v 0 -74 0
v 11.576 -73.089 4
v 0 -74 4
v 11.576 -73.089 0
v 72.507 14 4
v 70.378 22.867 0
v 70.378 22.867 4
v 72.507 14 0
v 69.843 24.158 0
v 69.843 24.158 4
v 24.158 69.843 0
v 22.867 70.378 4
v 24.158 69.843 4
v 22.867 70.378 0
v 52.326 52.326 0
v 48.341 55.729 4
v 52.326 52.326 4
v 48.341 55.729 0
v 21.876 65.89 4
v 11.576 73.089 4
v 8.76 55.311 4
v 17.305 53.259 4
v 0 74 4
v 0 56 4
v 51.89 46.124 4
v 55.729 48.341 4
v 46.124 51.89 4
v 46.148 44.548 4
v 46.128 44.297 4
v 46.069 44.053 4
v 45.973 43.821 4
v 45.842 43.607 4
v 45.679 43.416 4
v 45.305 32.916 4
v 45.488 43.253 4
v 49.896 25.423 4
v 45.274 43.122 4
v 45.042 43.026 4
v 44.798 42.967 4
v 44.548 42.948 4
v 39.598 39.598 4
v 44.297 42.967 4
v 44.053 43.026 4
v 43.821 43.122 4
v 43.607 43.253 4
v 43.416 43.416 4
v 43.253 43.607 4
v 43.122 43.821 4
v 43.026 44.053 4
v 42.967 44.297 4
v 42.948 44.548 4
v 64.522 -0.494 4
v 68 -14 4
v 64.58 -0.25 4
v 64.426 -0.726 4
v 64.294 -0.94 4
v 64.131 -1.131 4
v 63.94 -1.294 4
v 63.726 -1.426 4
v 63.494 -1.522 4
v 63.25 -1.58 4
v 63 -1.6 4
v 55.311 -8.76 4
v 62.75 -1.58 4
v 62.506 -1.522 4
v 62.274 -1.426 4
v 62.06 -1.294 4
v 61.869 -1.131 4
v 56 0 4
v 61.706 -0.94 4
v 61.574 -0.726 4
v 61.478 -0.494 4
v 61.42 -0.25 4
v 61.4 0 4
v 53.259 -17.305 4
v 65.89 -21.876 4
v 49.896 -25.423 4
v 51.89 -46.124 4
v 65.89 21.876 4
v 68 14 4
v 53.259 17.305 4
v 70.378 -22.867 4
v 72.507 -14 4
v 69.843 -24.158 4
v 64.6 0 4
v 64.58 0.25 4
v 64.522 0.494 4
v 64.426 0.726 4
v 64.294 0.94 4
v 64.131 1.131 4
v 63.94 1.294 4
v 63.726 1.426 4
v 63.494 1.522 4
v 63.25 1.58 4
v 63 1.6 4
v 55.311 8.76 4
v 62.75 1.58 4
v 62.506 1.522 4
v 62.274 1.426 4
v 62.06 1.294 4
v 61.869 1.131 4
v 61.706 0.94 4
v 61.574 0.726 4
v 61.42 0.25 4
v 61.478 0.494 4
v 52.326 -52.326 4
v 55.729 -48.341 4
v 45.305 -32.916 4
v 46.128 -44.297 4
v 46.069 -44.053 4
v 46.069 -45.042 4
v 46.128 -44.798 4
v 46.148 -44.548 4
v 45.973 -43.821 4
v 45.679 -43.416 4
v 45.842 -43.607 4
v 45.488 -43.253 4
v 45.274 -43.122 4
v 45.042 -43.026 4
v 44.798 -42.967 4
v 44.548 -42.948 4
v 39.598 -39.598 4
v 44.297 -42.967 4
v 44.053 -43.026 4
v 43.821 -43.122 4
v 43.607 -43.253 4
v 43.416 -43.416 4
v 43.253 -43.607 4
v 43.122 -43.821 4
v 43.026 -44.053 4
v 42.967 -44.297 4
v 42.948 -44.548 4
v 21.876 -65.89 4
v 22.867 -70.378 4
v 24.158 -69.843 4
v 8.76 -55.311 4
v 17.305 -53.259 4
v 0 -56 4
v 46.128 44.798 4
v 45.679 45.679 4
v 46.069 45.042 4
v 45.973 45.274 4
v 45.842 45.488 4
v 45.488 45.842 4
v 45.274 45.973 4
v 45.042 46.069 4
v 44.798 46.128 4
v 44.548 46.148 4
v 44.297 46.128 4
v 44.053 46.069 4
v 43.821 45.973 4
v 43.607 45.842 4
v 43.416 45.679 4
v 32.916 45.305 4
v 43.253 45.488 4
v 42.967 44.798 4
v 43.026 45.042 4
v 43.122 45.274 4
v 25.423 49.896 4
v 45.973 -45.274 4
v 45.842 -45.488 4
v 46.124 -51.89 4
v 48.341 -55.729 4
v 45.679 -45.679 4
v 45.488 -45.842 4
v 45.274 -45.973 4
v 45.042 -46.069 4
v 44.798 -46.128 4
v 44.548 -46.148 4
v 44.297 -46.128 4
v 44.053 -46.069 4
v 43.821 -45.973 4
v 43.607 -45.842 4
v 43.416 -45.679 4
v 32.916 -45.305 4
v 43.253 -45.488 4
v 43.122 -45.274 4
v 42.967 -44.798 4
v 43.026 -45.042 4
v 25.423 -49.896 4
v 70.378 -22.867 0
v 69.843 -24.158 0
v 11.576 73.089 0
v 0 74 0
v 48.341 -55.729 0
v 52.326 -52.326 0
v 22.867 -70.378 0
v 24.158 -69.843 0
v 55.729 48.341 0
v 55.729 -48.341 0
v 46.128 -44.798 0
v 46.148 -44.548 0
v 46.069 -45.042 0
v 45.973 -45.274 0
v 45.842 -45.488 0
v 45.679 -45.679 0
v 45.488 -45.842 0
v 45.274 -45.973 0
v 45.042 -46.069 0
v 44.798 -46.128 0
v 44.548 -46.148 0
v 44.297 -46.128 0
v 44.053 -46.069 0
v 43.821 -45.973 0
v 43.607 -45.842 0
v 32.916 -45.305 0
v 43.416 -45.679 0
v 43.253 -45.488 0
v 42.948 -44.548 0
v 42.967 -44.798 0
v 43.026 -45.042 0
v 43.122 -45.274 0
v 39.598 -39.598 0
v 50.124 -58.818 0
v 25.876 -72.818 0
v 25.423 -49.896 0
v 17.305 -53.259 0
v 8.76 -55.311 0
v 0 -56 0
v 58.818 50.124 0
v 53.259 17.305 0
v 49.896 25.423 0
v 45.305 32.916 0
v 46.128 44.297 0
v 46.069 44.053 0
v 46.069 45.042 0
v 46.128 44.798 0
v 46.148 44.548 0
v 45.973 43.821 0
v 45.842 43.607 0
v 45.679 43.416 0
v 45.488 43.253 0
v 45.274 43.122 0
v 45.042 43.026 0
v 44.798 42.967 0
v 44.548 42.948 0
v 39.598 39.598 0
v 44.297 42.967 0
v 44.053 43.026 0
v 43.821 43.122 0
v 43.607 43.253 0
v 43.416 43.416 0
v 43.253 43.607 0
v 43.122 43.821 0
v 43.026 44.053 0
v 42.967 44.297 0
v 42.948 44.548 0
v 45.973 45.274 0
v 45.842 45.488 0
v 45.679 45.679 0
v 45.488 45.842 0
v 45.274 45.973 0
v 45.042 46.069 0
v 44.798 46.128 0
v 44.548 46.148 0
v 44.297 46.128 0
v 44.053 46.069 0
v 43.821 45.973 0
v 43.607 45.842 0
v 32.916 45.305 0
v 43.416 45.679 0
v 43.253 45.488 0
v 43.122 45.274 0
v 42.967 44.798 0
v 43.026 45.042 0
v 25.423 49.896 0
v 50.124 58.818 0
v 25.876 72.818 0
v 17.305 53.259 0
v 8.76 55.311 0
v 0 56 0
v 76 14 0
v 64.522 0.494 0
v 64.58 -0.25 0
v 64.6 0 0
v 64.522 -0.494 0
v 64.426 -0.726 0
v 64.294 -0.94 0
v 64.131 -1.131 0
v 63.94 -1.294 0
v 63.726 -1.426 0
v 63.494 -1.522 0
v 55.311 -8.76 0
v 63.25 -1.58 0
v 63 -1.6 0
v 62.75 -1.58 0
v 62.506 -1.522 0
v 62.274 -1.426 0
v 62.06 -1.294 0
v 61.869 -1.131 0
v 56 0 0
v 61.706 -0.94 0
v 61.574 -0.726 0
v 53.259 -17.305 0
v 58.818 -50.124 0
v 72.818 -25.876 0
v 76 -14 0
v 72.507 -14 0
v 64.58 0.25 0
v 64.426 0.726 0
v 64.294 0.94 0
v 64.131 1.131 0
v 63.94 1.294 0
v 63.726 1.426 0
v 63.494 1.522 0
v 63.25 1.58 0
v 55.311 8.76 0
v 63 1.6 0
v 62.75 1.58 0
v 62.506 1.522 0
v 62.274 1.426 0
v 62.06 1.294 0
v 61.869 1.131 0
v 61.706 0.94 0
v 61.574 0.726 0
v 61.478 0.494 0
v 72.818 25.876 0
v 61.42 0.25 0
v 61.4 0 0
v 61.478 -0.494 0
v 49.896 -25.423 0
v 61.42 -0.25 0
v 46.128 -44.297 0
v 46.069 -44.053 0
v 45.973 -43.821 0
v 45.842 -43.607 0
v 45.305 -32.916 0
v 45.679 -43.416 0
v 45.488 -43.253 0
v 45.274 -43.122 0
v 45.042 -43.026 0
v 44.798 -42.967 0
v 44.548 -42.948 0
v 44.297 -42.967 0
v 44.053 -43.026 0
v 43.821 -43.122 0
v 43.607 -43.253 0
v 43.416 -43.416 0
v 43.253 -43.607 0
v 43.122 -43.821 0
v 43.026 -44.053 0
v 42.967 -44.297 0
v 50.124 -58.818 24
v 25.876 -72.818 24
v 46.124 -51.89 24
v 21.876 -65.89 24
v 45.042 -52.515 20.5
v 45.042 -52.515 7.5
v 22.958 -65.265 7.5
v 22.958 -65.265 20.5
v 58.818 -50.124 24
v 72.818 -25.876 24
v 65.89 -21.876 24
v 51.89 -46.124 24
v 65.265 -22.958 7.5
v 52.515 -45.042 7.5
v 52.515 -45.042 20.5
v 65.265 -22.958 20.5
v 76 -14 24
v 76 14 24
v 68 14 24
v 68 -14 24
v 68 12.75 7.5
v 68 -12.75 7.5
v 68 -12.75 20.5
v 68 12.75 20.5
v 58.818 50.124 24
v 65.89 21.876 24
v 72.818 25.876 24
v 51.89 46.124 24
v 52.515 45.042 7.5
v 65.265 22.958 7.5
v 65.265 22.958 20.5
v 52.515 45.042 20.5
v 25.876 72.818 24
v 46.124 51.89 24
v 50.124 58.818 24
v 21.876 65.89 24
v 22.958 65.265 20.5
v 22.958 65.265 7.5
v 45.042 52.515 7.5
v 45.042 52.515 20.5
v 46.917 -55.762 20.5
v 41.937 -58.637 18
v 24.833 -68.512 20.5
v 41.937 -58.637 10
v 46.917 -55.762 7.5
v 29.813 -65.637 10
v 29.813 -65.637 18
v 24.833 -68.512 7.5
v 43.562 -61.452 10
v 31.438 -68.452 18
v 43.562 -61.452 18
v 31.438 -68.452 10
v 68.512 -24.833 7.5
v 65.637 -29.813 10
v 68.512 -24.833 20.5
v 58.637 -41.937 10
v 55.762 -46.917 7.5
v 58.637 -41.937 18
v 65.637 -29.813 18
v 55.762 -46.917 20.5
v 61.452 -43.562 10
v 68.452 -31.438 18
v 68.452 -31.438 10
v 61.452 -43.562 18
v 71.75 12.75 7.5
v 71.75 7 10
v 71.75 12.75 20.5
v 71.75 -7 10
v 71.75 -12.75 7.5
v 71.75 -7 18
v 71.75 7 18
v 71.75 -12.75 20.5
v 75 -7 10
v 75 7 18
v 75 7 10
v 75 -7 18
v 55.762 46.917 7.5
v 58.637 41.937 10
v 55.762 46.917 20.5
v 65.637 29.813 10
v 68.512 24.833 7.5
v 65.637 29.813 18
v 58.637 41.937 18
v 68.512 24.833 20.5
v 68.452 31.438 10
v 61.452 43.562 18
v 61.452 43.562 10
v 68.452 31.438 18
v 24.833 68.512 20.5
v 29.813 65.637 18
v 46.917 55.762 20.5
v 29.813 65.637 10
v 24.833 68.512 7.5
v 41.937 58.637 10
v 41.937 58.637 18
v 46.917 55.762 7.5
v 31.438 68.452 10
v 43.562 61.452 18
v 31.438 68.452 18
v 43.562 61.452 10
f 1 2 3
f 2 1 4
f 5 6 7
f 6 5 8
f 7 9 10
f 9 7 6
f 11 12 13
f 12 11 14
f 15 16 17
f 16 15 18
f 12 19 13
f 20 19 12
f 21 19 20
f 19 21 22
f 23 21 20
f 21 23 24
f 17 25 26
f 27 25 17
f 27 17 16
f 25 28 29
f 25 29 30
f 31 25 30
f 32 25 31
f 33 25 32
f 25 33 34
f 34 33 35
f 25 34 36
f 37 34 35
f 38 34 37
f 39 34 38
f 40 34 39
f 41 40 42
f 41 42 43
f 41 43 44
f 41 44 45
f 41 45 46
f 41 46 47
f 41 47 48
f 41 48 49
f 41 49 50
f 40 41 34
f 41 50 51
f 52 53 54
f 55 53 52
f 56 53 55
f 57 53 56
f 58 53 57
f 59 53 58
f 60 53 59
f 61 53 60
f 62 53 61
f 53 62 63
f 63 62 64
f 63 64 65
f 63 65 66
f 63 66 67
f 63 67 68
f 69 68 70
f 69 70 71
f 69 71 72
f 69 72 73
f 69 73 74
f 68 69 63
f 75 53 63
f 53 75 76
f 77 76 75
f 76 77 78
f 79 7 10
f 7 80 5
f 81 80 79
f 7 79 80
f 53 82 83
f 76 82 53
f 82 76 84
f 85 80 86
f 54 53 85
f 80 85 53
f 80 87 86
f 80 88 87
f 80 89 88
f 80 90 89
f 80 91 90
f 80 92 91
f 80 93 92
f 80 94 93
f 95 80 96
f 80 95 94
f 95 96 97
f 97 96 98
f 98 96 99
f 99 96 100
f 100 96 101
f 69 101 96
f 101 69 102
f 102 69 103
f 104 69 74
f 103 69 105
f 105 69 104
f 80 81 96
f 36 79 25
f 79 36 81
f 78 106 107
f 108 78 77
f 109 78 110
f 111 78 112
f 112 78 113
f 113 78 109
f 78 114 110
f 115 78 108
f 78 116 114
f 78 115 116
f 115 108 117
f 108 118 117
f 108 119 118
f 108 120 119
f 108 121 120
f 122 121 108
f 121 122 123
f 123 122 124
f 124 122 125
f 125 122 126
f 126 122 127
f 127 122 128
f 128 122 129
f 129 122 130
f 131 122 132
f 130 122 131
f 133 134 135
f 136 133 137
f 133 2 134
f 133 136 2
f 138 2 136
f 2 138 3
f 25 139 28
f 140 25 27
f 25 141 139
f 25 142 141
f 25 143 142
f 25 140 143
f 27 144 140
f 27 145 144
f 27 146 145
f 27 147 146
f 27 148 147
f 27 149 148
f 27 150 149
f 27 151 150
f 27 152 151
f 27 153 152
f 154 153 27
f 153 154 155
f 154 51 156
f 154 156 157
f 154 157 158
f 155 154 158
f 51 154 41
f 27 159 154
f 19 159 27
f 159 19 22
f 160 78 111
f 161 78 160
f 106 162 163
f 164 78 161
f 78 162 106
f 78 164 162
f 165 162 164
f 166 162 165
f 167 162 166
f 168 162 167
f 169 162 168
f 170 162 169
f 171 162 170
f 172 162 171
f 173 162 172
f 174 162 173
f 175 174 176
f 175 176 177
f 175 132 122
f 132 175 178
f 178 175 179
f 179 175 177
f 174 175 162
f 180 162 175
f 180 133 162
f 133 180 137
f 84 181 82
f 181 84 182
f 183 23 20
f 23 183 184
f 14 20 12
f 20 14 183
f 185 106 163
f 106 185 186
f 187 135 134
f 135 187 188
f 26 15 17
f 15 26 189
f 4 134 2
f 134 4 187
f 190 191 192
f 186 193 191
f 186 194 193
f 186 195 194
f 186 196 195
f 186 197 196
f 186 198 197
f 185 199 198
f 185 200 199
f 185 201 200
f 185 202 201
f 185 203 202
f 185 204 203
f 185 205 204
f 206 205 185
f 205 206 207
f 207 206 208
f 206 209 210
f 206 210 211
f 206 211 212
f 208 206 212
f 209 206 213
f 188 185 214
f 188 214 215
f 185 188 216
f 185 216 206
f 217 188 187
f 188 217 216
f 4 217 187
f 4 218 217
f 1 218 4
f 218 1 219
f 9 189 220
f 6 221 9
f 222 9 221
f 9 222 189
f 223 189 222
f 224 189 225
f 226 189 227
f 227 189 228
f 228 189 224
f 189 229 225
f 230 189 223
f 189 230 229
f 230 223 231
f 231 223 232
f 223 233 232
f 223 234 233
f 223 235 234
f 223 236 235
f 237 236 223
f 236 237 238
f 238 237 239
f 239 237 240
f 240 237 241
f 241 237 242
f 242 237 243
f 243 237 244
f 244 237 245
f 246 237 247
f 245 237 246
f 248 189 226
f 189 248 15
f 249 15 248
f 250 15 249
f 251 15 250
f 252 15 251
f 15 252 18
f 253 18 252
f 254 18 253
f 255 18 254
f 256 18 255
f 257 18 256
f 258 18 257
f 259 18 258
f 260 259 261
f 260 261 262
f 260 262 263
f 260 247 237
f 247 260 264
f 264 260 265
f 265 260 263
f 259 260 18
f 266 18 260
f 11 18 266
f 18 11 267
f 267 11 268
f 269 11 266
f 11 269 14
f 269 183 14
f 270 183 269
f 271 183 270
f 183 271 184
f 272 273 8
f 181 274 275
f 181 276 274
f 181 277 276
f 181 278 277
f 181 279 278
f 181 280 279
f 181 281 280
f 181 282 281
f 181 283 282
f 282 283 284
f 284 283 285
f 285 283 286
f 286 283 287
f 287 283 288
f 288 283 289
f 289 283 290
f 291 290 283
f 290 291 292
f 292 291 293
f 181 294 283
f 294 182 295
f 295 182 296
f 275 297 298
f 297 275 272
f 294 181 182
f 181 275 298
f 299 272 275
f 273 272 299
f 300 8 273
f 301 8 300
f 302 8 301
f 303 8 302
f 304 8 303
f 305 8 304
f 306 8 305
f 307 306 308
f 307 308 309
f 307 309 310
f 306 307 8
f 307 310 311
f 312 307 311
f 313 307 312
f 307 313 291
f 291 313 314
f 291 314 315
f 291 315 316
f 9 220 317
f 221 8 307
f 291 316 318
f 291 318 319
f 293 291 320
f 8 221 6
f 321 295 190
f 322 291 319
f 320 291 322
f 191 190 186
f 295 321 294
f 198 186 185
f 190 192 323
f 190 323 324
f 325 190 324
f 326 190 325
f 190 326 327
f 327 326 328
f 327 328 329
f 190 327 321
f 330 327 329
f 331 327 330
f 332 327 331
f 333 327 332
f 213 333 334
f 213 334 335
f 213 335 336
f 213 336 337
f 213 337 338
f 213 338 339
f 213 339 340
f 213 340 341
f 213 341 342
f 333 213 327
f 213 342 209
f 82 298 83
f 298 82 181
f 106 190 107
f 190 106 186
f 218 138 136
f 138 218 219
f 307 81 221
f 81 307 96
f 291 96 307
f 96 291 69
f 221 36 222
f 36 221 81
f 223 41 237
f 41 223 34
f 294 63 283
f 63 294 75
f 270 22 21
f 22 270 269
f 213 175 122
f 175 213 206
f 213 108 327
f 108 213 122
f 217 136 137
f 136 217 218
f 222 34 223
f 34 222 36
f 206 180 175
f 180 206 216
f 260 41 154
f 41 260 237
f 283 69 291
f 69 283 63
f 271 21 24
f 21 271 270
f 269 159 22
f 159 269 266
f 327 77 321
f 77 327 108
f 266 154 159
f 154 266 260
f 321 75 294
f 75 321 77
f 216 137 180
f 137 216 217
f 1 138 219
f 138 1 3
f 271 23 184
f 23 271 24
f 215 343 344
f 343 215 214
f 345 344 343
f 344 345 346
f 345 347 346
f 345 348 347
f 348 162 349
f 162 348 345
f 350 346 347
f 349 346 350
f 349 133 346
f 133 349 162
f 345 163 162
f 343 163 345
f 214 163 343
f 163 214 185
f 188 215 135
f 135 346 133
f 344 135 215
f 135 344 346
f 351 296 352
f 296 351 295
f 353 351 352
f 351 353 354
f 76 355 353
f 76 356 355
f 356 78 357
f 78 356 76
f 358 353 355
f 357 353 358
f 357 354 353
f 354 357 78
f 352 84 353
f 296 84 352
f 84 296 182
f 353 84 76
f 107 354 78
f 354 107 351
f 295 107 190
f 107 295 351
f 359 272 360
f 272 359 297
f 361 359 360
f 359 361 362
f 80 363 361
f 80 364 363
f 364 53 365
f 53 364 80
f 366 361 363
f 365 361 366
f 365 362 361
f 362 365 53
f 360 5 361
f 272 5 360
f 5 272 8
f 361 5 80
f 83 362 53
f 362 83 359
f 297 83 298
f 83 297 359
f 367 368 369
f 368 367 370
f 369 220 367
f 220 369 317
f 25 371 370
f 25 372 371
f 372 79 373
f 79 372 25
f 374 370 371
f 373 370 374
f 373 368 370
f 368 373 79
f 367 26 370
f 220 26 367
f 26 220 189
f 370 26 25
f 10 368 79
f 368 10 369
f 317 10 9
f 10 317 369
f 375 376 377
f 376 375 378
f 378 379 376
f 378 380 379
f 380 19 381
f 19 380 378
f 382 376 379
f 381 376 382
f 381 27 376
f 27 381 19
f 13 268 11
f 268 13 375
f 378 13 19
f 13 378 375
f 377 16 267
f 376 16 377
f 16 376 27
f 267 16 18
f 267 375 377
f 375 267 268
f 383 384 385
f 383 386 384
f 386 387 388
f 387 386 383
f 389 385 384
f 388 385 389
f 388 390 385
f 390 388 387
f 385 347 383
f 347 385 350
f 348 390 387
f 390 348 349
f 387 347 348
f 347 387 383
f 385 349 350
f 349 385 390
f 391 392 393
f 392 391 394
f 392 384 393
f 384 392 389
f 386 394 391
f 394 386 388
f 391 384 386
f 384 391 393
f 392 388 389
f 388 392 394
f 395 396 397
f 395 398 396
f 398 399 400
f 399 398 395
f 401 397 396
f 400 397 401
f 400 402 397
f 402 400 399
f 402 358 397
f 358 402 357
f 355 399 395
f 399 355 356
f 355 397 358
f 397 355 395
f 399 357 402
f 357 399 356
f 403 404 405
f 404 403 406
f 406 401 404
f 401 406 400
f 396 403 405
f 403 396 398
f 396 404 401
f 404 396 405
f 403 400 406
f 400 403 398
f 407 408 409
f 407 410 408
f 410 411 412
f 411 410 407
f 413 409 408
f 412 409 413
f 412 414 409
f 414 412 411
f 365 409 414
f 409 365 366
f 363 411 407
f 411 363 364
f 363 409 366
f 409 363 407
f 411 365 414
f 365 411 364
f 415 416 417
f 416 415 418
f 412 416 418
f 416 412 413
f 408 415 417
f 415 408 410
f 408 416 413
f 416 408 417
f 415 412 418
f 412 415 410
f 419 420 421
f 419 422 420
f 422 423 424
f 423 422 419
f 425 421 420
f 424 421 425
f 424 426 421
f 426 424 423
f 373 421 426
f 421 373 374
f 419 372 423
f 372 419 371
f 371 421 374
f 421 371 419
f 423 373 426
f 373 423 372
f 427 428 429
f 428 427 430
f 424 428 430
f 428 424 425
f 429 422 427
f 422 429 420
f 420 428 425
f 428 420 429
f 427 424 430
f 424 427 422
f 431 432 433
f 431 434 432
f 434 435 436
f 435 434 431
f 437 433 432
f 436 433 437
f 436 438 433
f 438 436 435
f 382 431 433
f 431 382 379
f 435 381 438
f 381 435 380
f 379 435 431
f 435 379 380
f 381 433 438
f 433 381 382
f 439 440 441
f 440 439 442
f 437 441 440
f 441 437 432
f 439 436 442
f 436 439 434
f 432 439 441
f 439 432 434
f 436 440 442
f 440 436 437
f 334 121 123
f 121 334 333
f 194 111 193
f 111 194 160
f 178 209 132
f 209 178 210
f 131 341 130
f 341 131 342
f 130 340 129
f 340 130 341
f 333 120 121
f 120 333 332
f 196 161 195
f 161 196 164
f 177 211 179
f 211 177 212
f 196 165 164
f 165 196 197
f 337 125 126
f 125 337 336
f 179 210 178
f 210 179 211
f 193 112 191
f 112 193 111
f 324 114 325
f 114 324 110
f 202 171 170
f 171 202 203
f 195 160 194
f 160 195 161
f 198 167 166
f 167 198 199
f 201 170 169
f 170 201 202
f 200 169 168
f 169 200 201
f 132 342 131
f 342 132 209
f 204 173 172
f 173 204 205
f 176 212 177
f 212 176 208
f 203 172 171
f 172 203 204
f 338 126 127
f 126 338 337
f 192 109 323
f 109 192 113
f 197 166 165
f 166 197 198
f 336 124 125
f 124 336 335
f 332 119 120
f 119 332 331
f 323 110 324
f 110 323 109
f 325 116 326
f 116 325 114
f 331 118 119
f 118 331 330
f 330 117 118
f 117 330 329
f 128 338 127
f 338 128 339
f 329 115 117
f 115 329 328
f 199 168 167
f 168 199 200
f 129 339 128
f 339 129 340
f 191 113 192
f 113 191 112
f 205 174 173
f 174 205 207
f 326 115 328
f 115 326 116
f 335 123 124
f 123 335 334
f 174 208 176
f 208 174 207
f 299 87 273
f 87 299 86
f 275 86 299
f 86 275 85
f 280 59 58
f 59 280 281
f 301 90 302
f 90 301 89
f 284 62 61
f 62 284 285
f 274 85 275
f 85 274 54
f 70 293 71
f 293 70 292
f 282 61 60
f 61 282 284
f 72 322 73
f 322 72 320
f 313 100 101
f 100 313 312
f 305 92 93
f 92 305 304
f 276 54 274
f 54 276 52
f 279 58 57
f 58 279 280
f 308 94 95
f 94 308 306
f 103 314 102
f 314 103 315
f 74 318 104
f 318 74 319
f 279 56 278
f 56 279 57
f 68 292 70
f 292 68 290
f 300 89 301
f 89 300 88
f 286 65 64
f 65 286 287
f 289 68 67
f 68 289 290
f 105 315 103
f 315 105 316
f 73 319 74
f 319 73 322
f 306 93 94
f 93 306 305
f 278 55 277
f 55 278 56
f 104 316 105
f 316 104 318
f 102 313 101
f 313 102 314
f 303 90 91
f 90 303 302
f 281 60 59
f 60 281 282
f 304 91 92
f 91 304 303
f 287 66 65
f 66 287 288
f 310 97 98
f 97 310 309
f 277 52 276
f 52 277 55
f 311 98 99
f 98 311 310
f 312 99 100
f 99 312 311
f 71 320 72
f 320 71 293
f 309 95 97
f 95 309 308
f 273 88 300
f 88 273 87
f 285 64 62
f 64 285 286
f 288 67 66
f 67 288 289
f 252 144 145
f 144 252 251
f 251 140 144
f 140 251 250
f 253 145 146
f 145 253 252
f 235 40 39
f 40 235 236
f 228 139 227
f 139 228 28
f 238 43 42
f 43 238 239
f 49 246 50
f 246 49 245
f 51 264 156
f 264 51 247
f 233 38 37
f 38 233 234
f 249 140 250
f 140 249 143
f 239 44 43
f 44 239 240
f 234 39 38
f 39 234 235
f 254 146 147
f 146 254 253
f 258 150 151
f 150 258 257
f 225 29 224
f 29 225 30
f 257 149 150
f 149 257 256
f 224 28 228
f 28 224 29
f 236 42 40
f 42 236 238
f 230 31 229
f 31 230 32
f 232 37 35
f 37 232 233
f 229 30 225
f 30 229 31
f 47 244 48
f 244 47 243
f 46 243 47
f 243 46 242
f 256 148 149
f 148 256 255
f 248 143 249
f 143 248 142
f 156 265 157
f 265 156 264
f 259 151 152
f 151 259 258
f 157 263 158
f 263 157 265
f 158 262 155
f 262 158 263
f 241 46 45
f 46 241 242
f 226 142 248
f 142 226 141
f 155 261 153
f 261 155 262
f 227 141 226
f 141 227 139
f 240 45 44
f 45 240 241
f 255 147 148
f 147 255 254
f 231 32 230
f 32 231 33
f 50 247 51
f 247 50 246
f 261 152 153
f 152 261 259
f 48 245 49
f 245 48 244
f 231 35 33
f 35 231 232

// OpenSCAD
// RoverSAR 5-Channel VL53L0X Time-of-Flight Sensor Arc Mount
// Angles: -60 deg, -30 deg, 0 deg, +30 deg, +60 deg | Mounting: M3 base bolts + M2.5 PCB screws

$fn = 40;

arc_radius = 68.0;
mount_height = 24.0;
wall_thick = 4.0;
angles = [-60, -30, 0, 30, 60];

module sensor_pocket() {
    // Breakout board cavity (25mm W x 12mm H) + optical emitter/SPAD window
    translate([0, 0, mount_height / 2 + 2.0]) {
        cube([4.5, 25.5, 13.0], center = true);
        translate([2.5, 0, 0])
            cube([6.0, 14.0, 8.0], center = true);
    }
}

difference() {
    union() {
        // Curved mounting flange base
        difference() {
            cylinder(h = 4.0, r = arc_radius + 6.0);
            translate([0, 0, -0.5]) cylinder(h = 5.0, r = arc_radius - 12.0);
            translate([-80, -80, -0.5]) cube([80, 160, 5.0]);
        }

        // Sensor bay bosses
        for (a = angles) {
            rotate([0, 0, a])
                translate([arc_radius, 0, 0])
                    translate([0, -14.0, 0])
                        cube([wall_thick + 4.0, 28.0, mount_height]);
        }
    }

    // Carve optical windows & breakout slots
    for (a = angles) {
        rotate([0, 0, a])
            translate([arc_radius + 1.5, 0, 0])
                sensor_pocket();
    }

    // M3 base-plate mounting holes
    for (a = [-45, 0, 45]) {
        rotate([0, 0, a])
            translate([arc_radius - 5.0, 0, -0.5])
                cylinder(h = 5.0, d = 3.2);
    }
}
